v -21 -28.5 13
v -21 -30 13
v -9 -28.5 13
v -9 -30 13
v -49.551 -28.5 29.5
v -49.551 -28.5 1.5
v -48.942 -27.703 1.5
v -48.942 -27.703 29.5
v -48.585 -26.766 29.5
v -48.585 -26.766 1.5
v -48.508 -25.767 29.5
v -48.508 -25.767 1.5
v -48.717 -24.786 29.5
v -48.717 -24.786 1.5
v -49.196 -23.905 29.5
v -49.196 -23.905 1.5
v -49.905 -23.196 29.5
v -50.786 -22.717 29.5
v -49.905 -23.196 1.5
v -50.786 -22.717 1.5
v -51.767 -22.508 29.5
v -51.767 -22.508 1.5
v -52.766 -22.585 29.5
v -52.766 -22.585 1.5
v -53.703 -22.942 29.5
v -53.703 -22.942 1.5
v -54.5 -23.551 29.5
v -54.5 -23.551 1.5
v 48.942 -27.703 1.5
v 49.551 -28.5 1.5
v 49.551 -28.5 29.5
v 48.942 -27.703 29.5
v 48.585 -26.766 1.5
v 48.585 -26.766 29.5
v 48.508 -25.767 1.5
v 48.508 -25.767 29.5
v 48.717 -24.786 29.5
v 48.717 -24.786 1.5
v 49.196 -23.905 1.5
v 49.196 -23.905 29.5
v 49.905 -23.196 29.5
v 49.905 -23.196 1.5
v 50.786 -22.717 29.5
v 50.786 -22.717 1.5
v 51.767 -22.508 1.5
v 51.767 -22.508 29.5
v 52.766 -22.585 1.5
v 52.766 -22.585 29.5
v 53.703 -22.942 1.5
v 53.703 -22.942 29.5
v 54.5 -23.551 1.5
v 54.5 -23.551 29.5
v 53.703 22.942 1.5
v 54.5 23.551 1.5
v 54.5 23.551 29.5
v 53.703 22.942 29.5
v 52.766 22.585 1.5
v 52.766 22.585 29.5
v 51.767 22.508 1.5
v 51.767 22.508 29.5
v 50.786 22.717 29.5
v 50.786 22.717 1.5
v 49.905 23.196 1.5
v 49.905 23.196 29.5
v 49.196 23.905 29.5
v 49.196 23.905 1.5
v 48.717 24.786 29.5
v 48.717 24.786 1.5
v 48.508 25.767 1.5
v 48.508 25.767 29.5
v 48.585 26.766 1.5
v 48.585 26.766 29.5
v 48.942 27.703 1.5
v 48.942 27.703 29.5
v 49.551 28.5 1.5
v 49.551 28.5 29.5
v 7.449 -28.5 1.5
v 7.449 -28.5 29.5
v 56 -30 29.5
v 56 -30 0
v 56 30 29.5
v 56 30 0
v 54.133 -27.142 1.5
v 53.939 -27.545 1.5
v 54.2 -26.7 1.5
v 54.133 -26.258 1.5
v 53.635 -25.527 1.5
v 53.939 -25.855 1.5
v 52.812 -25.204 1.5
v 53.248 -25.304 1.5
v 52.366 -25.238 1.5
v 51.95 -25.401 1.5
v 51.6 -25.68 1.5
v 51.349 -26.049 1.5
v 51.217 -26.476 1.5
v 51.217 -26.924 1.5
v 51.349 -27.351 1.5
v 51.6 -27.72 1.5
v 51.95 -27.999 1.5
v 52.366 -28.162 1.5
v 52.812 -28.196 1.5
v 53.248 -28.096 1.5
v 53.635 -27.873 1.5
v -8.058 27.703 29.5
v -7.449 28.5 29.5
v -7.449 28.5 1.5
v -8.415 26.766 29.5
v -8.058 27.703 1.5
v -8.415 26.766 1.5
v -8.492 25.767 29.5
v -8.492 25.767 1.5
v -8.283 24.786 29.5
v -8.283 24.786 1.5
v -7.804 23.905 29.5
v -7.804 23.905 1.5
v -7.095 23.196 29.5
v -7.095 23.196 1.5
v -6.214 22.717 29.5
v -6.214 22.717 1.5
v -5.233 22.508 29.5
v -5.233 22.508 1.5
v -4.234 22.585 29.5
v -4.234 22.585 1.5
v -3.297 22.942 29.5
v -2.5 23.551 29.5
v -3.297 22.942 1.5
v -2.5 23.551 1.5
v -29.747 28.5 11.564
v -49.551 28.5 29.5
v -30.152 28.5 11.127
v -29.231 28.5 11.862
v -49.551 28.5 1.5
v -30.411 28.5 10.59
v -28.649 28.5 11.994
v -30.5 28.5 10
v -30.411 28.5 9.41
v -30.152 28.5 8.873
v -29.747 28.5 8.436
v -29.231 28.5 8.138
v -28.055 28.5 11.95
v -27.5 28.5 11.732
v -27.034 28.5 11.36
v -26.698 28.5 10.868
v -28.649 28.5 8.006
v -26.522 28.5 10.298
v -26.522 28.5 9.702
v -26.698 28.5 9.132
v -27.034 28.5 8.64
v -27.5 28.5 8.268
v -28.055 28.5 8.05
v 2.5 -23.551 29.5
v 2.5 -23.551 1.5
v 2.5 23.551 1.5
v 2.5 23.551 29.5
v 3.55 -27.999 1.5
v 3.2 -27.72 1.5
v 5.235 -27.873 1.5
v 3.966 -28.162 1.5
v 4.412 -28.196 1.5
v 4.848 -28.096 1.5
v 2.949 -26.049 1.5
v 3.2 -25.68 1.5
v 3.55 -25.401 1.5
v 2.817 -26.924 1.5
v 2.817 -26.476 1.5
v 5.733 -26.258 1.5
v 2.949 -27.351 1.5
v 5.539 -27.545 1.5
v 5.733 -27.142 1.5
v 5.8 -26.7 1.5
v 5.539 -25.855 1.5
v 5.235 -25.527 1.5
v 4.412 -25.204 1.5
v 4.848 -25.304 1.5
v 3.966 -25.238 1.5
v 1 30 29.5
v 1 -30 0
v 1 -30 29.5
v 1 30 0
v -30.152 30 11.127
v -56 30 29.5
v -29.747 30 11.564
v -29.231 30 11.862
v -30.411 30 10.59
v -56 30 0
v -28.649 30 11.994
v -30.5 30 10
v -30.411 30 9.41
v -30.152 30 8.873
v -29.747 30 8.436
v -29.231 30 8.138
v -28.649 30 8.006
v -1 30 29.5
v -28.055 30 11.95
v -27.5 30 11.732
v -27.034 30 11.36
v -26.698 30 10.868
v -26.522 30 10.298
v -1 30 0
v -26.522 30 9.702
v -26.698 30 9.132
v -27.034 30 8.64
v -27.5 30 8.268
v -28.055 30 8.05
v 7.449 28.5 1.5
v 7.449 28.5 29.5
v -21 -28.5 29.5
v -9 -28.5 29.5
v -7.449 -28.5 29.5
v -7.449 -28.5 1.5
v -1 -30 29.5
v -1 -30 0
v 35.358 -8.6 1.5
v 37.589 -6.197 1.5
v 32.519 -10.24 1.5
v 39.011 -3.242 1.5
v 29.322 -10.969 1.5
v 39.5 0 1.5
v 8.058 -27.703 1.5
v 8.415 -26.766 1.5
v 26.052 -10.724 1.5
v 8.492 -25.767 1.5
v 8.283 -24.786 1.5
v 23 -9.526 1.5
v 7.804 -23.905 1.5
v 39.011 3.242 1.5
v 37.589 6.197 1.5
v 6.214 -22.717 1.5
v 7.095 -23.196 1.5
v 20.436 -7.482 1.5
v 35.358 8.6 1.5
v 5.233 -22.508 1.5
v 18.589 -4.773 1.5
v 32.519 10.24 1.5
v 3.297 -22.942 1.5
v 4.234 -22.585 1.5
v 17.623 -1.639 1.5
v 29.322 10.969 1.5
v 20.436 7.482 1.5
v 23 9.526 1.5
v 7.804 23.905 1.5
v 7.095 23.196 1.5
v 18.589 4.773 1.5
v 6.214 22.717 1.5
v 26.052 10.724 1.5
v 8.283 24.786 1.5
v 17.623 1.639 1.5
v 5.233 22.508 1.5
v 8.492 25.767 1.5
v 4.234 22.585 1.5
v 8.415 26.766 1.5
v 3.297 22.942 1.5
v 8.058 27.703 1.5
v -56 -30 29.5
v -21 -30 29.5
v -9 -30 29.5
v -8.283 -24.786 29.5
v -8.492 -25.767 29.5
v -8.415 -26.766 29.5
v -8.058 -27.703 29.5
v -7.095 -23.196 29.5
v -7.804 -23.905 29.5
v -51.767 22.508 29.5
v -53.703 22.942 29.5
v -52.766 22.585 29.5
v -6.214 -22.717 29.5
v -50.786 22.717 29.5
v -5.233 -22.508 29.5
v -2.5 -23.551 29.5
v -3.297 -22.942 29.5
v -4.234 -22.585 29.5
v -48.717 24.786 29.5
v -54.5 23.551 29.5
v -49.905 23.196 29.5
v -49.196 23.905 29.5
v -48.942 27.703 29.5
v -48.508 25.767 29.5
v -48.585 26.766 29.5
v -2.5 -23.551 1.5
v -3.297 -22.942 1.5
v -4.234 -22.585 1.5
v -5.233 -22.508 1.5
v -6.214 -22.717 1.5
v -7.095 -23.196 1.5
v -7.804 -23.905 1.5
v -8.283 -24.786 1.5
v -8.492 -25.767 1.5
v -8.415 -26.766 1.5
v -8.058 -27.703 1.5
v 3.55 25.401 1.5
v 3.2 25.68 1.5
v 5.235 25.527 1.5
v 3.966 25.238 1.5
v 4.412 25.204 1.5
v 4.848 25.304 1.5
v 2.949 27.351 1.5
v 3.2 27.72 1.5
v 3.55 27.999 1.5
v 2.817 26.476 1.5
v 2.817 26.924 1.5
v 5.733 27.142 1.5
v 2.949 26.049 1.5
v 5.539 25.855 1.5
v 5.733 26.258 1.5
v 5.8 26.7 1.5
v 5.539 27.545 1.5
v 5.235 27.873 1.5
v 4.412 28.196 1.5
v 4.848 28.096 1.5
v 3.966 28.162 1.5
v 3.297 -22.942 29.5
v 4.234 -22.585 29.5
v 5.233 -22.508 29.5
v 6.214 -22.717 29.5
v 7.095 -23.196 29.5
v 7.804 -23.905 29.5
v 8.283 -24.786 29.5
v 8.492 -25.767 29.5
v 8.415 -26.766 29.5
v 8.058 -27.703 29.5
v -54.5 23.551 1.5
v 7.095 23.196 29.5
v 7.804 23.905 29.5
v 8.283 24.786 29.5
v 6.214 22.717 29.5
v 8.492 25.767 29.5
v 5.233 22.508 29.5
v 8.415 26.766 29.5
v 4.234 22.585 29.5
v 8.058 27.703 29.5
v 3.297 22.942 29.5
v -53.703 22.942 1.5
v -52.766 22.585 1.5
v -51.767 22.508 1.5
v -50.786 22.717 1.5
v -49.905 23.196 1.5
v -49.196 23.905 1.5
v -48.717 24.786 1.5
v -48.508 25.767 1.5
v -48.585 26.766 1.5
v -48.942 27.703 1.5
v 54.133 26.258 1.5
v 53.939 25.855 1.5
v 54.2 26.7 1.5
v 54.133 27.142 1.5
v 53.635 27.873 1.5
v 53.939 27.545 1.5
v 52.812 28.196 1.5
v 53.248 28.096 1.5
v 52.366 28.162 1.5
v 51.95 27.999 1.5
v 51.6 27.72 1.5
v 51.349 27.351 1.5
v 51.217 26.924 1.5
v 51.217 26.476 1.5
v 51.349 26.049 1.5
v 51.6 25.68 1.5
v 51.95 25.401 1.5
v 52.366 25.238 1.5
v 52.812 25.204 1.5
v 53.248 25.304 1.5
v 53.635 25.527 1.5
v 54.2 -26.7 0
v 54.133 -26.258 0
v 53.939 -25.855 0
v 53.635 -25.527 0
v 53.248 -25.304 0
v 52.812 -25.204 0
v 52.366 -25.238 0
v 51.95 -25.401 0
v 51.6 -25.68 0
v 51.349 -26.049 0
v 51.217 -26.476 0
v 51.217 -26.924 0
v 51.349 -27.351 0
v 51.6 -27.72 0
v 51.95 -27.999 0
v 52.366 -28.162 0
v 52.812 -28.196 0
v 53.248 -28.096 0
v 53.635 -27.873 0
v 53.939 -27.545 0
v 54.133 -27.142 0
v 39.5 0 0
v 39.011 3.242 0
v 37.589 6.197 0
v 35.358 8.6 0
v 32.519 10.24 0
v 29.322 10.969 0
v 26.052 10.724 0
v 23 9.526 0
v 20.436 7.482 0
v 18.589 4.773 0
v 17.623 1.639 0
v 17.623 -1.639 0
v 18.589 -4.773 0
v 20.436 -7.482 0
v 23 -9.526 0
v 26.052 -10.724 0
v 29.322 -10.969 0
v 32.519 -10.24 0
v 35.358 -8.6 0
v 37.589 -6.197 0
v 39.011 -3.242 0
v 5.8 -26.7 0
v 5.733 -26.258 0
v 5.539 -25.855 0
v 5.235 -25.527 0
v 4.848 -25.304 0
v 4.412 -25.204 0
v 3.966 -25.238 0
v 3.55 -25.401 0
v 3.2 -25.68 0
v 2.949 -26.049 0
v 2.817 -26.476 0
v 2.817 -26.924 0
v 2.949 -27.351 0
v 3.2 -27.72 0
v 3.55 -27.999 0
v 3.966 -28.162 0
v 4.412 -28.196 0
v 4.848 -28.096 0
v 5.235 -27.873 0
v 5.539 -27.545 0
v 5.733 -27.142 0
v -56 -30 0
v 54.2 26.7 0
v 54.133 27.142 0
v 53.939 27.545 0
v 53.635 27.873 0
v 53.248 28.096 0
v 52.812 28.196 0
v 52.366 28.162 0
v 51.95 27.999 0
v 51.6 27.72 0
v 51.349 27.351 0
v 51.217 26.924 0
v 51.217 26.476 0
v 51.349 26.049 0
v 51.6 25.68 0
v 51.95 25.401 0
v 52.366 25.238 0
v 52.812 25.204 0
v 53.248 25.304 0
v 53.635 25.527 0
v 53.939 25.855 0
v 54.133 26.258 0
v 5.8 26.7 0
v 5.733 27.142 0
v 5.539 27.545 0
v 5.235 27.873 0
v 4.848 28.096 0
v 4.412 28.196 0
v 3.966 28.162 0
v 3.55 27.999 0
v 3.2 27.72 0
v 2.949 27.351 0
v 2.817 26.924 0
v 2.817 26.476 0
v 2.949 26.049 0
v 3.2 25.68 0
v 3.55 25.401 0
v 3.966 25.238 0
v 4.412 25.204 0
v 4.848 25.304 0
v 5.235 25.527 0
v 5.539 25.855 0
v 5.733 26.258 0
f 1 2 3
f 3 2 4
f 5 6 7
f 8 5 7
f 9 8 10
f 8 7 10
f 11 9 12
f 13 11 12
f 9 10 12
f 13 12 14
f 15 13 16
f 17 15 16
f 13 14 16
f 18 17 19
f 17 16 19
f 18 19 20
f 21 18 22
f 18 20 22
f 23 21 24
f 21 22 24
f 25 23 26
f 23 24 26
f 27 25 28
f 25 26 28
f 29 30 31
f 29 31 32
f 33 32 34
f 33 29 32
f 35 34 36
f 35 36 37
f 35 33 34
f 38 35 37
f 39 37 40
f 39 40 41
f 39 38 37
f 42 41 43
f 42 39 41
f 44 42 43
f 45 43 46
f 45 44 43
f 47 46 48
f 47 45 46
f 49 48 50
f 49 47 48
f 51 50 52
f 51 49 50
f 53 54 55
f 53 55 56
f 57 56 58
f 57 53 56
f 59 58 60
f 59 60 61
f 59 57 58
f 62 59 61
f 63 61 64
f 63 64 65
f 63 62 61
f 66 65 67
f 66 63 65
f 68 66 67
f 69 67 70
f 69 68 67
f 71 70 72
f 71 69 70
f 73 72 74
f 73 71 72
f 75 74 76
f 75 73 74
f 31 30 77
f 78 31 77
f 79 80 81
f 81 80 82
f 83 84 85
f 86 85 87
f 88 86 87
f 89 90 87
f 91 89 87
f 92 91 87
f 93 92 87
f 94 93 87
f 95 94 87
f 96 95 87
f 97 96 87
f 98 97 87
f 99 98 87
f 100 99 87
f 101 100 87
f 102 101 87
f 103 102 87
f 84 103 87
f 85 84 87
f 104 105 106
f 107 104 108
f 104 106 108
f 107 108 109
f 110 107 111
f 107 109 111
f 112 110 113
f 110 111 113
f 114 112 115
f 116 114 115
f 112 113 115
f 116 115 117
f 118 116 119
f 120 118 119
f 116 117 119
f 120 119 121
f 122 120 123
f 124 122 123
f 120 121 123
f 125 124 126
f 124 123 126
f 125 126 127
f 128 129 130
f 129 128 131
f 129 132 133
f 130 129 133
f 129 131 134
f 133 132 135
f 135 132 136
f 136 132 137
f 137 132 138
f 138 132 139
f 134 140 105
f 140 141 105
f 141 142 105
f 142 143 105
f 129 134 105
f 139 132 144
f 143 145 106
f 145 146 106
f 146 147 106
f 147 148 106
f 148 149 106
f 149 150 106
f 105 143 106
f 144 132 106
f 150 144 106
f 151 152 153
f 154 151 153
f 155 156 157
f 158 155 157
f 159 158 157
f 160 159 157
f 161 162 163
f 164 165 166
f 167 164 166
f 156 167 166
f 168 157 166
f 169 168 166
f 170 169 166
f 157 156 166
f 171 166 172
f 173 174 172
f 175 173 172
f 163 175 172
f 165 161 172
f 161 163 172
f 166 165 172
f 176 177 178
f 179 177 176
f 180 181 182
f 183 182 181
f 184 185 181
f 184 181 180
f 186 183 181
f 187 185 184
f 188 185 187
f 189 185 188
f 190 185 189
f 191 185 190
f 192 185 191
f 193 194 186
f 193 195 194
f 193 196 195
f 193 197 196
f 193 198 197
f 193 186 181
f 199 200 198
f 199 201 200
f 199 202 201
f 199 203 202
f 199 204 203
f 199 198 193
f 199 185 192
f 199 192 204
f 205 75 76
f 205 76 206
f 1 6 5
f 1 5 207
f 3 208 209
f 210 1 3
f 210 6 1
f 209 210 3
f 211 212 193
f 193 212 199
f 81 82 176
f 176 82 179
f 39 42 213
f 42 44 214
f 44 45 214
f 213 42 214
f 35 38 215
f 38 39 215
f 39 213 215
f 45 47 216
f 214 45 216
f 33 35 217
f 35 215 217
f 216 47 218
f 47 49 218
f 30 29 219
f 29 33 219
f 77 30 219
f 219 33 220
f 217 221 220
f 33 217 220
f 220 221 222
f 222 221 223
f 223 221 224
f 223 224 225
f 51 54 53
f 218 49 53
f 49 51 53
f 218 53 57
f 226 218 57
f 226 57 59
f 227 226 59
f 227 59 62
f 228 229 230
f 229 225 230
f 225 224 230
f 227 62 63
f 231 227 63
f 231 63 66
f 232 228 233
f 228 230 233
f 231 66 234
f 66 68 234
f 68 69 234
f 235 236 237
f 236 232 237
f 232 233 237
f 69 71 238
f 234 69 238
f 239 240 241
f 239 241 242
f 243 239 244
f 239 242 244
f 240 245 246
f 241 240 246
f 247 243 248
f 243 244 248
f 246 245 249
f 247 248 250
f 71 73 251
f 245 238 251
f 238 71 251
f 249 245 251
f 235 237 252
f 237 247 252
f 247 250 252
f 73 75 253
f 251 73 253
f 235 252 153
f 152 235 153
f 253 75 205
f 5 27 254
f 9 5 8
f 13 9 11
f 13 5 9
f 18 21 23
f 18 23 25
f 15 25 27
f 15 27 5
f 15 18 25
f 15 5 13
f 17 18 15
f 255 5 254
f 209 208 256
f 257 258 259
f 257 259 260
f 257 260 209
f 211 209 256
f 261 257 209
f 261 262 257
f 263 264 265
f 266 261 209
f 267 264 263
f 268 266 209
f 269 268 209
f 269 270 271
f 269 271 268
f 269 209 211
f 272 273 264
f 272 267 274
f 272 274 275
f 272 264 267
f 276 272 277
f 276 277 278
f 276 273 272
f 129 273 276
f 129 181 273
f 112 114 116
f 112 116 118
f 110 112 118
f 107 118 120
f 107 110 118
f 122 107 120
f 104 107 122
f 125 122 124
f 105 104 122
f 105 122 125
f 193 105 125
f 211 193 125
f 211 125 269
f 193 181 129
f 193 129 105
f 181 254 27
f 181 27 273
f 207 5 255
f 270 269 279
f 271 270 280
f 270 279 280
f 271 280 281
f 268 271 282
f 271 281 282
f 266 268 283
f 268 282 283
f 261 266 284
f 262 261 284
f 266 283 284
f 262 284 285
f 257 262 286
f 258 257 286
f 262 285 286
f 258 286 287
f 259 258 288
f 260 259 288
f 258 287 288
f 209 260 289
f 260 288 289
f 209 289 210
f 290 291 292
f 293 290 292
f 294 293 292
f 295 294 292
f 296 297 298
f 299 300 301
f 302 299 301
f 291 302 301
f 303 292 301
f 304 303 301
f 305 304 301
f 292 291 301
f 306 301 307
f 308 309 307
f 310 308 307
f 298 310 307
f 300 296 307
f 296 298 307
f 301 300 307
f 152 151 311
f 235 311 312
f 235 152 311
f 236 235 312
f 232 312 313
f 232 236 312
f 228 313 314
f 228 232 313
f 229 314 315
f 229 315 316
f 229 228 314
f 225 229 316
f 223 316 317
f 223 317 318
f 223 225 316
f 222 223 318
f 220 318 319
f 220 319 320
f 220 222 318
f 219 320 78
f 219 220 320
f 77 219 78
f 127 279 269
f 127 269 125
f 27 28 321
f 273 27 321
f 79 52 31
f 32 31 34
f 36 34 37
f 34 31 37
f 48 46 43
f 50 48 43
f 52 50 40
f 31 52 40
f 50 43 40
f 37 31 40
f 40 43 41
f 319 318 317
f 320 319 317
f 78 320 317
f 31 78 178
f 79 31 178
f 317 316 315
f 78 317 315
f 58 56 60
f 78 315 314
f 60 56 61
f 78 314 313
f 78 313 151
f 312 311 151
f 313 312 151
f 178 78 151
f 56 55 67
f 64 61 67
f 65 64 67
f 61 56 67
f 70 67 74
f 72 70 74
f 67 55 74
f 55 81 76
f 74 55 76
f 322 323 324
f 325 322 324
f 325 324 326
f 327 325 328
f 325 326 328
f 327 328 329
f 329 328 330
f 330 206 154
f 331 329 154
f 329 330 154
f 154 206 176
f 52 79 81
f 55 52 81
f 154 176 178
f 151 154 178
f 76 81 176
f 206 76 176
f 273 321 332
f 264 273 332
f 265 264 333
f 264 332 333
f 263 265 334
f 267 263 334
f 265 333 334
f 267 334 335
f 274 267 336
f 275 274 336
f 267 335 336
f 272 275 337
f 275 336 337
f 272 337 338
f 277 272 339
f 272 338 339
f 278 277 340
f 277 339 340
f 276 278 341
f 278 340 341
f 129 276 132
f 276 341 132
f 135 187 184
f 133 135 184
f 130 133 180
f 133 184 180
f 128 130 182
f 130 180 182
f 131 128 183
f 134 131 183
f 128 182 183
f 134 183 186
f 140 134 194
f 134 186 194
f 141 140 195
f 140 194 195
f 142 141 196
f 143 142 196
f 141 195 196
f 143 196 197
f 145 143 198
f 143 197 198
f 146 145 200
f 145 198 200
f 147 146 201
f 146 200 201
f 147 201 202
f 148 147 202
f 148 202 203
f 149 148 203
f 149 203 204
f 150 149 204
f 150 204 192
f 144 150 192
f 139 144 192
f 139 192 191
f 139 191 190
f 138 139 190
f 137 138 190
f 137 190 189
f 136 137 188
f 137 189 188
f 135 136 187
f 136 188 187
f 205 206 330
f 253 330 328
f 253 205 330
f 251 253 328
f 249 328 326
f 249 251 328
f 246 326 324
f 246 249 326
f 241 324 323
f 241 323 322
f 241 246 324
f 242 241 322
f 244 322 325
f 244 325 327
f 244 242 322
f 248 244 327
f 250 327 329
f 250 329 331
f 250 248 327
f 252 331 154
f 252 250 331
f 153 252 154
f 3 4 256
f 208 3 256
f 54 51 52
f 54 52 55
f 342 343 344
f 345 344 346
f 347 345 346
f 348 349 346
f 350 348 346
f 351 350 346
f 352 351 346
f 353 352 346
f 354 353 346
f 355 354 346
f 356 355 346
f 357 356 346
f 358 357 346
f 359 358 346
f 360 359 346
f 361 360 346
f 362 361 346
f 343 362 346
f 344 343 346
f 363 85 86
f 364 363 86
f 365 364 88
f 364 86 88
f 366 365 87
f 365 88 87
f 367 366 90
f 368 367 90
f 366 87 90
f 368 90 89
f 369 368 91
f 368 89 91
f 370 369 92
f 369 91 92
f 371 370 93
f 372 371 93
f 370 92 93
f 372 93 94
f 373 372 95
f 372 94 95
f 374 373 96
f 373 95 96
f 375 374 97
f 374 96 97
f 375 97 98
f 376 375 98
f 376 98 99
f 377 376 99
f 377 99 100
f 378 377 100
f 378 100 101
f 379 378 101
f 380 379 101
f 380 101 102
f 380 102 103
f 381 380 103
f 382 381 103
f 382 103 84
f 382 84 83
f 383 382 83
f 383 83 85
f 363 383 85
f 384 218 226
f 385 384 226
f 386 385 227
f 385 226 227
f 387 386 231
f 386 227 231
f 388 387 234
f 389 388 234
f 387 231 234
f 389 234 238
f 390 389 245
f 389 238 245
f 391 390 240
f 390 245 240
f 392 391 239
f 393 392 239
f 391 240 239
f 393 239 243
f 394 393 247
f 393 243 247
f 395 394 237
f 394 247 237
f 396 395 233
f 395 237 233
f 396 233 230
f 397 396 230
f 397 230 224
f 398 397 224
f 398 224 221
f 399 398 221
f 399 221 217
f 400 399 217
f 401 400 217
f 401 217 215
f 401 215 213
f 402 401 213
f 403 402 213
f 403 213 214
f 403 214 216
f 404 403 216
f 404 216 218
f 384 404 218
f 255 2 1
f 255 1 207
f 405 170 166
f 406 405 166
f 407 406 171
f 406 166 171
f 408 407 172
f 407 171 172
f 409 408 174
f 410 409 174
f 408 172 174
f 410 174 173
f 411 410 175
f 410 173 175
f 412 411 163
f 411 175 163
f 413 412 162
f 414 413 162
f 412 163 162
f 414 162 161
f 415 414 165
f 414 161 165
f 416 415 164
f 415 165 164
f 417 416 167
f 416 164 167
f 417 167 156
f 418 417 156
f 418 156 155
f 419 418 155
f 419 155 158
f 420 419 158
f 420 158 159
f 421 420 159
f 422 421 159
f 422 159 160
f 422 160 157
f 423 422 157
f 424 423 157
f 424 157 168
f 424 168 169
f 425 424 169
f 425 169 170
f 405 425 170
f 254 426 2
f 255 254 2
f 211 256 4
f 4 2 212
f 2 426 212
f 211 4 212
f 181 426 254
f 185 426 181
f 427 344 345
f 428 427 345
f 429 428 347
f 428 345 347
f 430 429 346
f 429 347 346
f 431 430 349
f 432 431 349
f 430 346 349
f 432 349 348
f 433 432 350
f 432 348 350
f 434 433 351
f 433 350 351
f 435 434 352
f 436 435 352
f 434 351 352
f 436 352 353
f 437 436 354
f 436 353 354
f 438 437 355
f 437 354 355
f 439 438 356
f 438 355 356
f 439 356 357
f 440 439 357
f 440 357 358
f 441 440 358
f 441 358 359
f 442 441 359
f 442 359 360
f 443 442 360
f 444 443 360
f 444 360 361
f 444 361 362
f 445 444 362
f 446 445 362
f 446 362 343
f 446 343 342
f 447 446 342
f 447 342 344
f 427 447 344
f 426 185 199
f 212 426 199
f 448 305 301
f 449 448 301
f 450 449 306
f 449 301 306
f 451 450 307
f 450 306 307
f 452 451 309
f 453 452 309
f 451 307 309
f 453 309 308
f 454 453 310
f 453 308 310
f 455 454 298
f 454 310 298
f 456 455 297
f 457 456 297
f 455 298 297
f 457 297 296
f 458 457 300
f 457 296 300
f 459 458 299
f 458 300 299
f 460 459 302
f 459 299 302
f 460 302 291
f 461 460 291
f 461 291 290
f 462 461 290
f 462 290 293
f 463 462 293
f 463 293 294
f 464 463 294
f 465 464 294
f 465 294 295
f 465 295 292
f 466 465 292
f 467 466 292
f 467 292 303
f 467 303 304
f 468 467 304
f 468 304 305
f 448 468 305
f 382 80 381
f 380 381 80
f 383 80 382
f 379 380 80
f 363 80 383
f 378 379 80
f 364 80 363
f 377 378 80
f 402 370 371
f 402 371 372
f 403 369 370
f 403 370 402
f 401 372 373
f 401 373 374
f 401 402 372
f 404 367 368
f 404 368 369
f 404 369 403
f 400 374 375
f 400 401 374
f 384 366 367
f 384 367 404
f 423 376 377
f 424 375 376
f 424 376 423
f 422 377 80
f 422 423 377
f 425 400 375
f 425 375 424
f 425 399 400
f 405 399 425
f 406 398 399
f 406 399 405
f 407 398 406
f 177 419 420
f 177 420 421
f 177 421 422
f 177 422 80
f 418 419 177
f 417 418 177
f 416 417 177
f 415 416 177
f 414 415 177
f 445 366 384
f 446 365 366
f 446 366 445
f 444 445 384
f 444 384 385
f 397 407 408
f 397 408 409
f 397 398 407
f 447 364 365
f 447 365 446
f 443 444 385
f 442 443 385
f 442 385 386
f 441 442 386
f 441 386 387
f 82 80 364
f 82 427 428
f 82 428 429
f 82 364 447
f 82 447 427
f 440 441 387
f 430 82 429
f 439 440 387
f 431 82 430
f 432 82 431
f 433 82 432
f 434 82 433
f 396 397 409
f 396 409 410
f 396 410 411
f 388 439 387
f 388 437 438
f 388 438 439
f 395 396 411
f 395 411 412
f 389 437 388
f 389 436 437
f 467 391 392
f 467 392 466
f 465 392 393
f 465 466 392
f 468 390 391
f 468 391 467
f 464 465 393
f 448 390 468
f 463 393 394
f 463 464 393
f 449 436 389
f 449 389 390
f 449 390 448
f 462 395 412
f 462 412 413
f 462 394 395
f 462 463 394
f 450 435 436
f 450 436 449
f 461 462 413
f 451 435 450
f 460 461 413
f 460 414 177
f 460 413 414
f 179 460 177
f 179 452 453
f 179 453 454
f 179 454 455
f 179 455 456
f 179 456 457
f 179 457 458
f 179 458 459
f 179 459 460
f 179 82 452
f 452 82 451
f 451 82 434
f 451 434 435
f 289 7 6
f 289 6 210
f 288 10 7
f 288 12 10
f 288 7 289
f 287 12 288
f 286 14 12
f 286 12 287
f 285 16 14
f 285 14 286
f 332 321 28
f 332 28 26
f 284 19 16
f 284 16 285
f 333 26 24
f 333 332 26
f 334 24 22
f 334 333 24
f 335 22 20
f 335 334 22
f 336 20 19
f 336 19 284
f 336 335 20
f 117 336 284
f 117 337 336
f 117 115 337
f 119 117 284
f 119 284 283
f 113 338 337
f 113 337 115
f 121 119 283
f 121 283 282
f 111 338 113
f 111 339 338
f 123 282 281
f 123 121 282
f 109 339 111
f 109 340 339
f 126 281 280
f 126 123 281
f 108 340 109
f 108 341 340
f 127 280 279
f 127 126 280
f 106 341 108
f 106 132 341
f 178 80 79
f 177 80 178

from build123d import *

# Parameters (mm, degrees)
F0_W      = 55
F0_H      = 60
F1_DEPTH  = 1.5
F2_W      = 55
F2_H      = 60
F2_W_2    = 52
F2_H_2    = 57
F3_DEPTH  = 28
F5_DEPTH  = 28
F7_R      = 11
F7_R_2    = 1.5
F8_DEPTH  = 1.501
F9_W      = 12
F9_H      = 16.5
F10_DEPTH = 1.5
F11_R     = 2
F12_DEPTH = 1.5


with BuildPart() as f1:
    # F0 (on Top) → F1 (new body)
    with BuildSketch(Plane.XY):
        with Locations((-28.5, 0)):
            Rectangle(F0_W, F0_H)
    extrude(amount=F1_DEPTH)

    # F2 (on face) → F3 (join)
    with BuildSketch(Plane.XY.offset(1.5)):
        with Locations((-28.5, 0)):
            Rectangle(F2_W, F2_H)
        with Locations((-28.5, 0)):
            Rectangle(F2_W_2, F2_H_2, mode=Mode.SUBTRACT)
    extrude(amount=F3_DEPTH)

    # F4 (on face) → F5 (join, through all)
    with BuildSketch(Plane.XY.offset(1.5)):
        with BuildLine():
            ThreePointArc((-54.5, 26), (-52, 23.5), (-49.5, 26))
            ThreePointArc((-49.5, 26), (-50.232233047, 27.767766953), (-52, 28.5))
            ThreePointArc((-52, 28.5), (-53.767766953, 27.767766953), (-54.5, 26))
        make_face()
        with BuildLine():
            ThreePointArc((-52, 28.5), (-50.232233047, 27.767766953), (-49.5, 26))
            ThreePointArc((-49.5, 26), (-52, 23.5), (-54.5, 26))
            Line((-54.5, 26), (-54.5, 23.5505102572))
            ThreePointArc((-54.5, 23.5505102572), (-49.5251262658, 23.5251262658), (-49.5505102572, 28.5))
            Line((-49.5505102572, 28.5), (-52, 28.5))
        make_face()
        with BuildLine():
            ThreePointArc((-54.5, 26), (-53.767766953, 27.767766953), (-52, 28.5))
            Line((-52, 28.5), (-54.4494897428, 28.5))
            ThreePointArc((-54.4494897428, 28.5), (-54.4748737342, 28.4748737342), (-54.5, 28.4494897428))
            Line((-54.5, 28.4494897428), (-54.5, 26))
        make_face()
        with BuildLine():
            ThreePointArc((-54.5, 28.4494897428), (-54.4748737342, 28.4748737342), (-54.4494897428, 28.5))
            Line((-54.4494897428, 28.5), (-54.5, 28.5))
            Line((-54.5, 28.5), (-54.5, 28.4494897428))
        make_face()
        with BuildLine():
            ThreePointArc((-5, 28.5), (-6.767766953, 24.232233047), (-2.5, 26))
            ThreePointArc((-2.5, 26), (-3.232233047, 27.767766953), (-5, 28.5))
        make_face()
        with BuildLine():
            Line((-2.5, 23.5505102572), (-2.5, 26))
            ThreePointArc((-2.5, 26), (-6.767766953, 24.232233047), (-5, 28.5))
            Line((-5, 28.5), (-7.4494897428, 28.5))
            ThreePointArc((-7.4494897428, 28.5), (-7.4748737342, 23.5251262658), (-2.5, 23.5505102572))
        make_face()
        with BuildLine():
            ThreePointArc((-5, 28.5), (-3.232233047, 27.767766953), (-2.5, 26))
            Line((-2.5, 26), (-2.5, 28.5))
            Line((-2.5, 28.5), (-5, 28.5))
        make_face()
        with BuildLine():
            Line((-52, -28.5), (-49.5505102572, -28.5))
            ThreePointArc((-49.5505102572, -28.5), (-49.5251262658, -23.5251262658), (-54.5, -23.5505102572))
            Line((-54.5, -23.5505102572), (-54.5, -26))
            ThreePointArc((-54.5, -26), (-52, -23.5), (-49.5, -26))
            ThreePointArc((-49.5, -26), (-50.232233047, -27.767766953), (-52, -28.5))
        make_face()
        with BuildLine():
            Line((-54.5, -28.5), (-52, -28.5))
            ThreePointArc((-52, -28.5), (-53.767766953, -27.767766953), (-54.5, -26))
            Line((-54.5, -26), (-54.5, -28.5))
        make_face()
        with BuildLine():
            ThreePointArc((-54.5, -26), (-53.767766953, -27.767766953), (-52, -28.5))
            ThreePointArc((-52, -28.5), (-50.232233047, -27.767766953), (-49.5, -26))
            ThreePointArc((-49.5, -26), (-52, -23.5), (-54.5, -26))
        make_face()
        with BuildLine():
            ThreePointArc((-2.5, -23.5505102572), (-7.4748737342, -23.5251262658), (-7.4494897428, -28.5))
            Line((-7.4494897428, -28.5), (-5, -28.5))
            ThreePointArc((-5, -28.5), (-6.767766953, -24.232233047), (-2.5, -26))
            Line((-2.5, -26), (-2.5, -23.5505102572))
        make_face()
        with BuildLine():
            ThreePointArc((-2.5, -26), (-3.232233047, -27.767766953), (-5, -28.5))
            Line((-5, -28.5), (-2.5, -28.5))
            Line((-2.5, -28.5), (-2.5, -26))
        make_face()
        with BuildLine():
            ThreePointArc((-2.5, -26), (-6.767766953, -24.232233047), (-5, -28.5))
            ThreePointArc((-5, -28.5), (-3.232233047, -27.767766953), (-2.5, -26))
        make_face()
    extrude(amount=F5_DEPTH)


with BuildPart() as f6_1:
    # F6: instance of F1
    add(f1.part.mirror(Plane.YZ))

    # F7 (on face) → F8 (cut, through all)
    with BuildSketch(Plane.XY.offset(1.5)):
        with Locations((28.5, 0)):
            Circle(F7_R)
        with Locations((4.3, 26.7)):
            Circle(F7_R_2)
        with Locations((52.7, 26.7)):
            Circle(F7_R_2)
        with Locations((52.7, -26.7)):
            Circle(F7_R_2)
        with Locations((4.3, -26.7)):
            Circle(F7_R_2)
    extrude(amount=-F8_DEPTH, mode=Mode.SUBTRACT)


with BuildPart() as f1_1:
    add(f1.part)

    # F9 (on face) → F10 (cut, through all)
    with BuildSketch(Plane.XZ.offset(30)):
        with Locations((-15, 21.25)):
            Rectangle(F9_W, F9_H)
    extrude(amount=-F10_DEPTH, mode=Mode.SUBTRACT)

    # F11 (on face) → F12 (cut, through all)
    with BuildSketch(Plane(origin=(0, 30, 0), x_dir=(-1, 0, 0), z_dir=(0, 1, 0))):
        with Locations((28.5, 10)):
            Circle(F11_R)
    extrude(amount=-F12_DEPTH, mode=Mode.SUBTRACT)


solid = Compound([f6_1.part, f1_1.part])
